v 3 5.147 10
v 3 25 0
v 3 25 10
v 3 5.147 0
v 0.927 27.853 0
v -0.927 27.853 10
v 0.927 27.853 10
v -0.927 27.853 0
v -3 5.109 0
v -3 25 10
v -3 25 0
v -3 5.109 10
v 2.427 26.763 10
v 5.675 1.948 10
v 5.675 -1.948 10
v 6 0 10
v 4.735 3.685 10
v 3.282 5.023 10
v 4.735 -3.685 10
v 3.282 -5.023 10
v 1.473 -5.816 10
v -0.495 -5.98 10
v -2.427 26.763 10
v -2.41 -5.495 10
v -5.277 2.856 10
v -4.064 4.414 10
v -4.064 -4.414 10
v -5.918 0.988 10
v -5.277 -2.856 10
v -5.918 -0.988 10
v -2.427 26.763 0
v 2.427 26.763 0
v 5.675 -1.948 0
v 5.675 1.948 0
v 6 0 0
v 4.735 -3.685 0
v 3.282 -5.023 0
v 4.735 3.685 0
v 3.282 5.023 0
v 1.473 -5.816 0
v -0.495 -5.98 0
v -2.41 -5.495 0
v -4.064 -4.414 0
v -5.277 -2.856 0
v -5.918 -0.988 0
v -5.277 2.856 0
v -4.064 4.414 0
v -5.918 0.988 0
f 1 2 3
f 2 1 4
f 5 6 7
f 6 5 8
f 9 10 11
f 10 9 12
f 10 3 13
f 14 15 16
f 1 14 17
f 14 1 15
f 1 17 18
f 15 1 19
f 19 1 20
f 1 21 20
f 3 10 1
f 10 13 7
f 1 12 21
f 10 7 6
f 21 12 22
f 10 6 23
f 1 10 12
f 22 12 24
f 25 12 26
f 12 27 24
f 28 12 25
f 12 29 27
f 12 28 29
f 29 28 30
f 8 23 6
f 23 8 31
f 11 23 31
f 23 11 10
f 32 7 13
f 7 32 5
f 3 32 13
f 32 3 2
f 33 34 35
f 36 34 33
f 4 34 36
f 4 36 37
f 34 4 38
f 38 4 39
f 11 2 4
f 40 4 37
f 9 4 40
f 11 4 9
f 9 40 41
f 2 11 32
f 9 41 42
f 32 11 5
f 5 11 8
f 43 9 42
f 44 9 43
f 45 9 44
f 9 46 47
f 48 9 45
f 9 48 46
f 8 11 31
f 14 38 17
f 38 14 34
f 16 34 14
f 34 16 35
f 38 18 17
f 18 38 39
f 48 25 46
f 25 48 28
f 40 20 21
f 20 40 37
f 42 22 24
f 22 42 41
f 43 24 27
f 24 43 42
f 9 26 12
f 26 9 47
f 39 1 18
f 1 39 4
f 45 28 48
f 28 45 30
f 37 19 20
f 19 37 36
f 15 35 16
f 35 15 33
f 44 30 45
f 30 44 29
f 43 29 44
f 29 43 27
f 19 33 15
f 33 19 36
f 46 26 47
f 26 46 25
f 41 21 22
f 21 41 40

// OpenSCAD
// LibFile: utilities.scad
//   A collection of utilities originally developed for the OpenFlexure
//   microscope.
//   
//   (c) Richard Bowman, January 2016
//   Released under the CERN Open Hardware License

// Until we figure out a neater way to do this, I am using a commoncode
// block to include this file for the examples.  Using the Include: block
// will be confusing because we don't install it in the libraries folder
// by default...
// CommonCode:
//    use <./openscad/libs/utilities.scad>;


// Function: tiny()
// Description: 
//   This is a tiny distance. In many places, it is helpful to shift
//   surfaces by a small distance, e.g. to ensure overlap or avoid
//   degenerate points.  `tiny()` is that distance, currently 0.05.
//   
//   `tiny()` was formerly known as `d` in the code 
//   but that caused confusion with diameters.
function tiny() = 0.05;

// Function: zero_z()
// Usage: zero_z(vector)
// Description: 
//   Return a copy of a 3-element vector, with the third (z) component set to 0
function zero_z(size) = [size.x, size.y, 0]; //set the Z component of a 3-vector to 0

function if_undefined_set_default(argument, default) = is_undef(argument) ? default : argument;

// Function: translate_x()
// Usage: translate_x(dist)
// Description: 
//   Translate in the X direction.  Equivalent to `translate([dist, 0, 0])`.
module translate_x(x_tr){
    translate([x_tr, 0, 0]){
        children();
    }
}

// Function: translate_y()
// Usage: translate_y(dist)
// Description: 
//   Translate in the Y direction.  Equivalent to `translate([0, dist, 0])`.
module translate_y(y_tr){
    translate([0, y_tr, 0]){
        children();
    }
}

// Function: translate_z()
// Usage: translate_z(dist)
// Description: 
//   Translate in the Z direction.  Equivalent to `translate([0, 0, dist])`.
module translate_z(z_tr){
    translate([0, 0, z_tr]){
        children();
    }
}

// Function: rotate_x()
// Usage: rotate_x(angle)
// Description: Rotate about X axis. Equivalent to `rotate([angle, 0, 0])`.
module rotate_x(x_angle){
    rotate([x_angle, 0, 0]){
        children();
    }
}

// Function: rotate_y()
// Usage: rotate_y(angle)
// Description: Rotate about Y axis. Equivalent to `rotate([0, angle, 0])`.
module rotate_y(y_angle){
    rotate([0, y_angle, 0]){
        children();
    }
}

// Function: rotate_z()
// Usage: rotate_z(angle)
// Description: Rotate about Z axis. Equivalent to `rotate([0, 0, angle])`.
module rotate_z(z_angle){
    rotate([0, 0, z_angle]){
        children();
    }
}

// Function: reflect()
// Usage: reflect(axis)
// Arguments:
//   axis = a 2- or 3D vector giving the axis to reflect in
// Description:
//   Duplicate the children of this module, once unmodified, and
//   once mirrored about the specified axis.  The mirrored copy
//   is equivalent to `mirror(axis) children()`.
//   
//   Conveninece functions `reflect_x`, `reflect_y`, and `reflect_z`
//   are defined to reflect about the respective axes.
// Examples(3D):
//   reflect([1,0,0]) translate([10,0,0]) cube(10);
//   reflect_x() translate([10,0,0]) cube(10);
module reflect(axis){
    //reflects children about the origin, keeping the originals
    children();
    mirror(axis){
        children();
    }
}


module reflect_x(){
    //shorthand for reflecting in x
    reflect([1, 0, 0]){
        children();
    }
}

module reflect_y(){
    //shorthand for reflecting in y
    reflect([0, 1, 0]){
        children();
    }
}

module reflect_z(){
    //shorthand for reflecting in z
    reflect([0, 0, 1]){
        children();
    }
}


function vector_mirror_x(vec) = _vector_mirror_axis(vec, 0);
function vector_mirror_y(vec) = _vector_mirror_axis(vec, 1);
function vector_mirror_z(vec) = _vector_mirror_axis(vec, 2);

function _vector_mirror_axis(vec, axis_index) = [
    for (i = [0:len(vec)-1])
        if (i==axis_index)
            -vec[i]
        else
            vec[i]
];

// Module: repeat()
// Usage: repeat(delta, N, center=false)
// Arguments:
//   delta = vector specifying the displacement between adjacent copies
//   N = total number of copies
//   ---
//   center = The default, `false`, places the first copy at its original location and the last is displaced by `(N-1)*delta`.  Set to `true` to centre the copies on the original location.
// Description:
//   Create a linear arry of copies of a geometry.
// Examples:
//   repeat([10,0,0], 4) cube(5);
//   repeat([10,0,0], 4, center=true) cube(5, center=true);
module repeat(delta, N, center=false){
    //repeat children along a regular array
    center_tr = (center ?  -(N-1)/2 : 0) * delta;
    translate(center_tr){
        for(i=[0:1:(N-1)]){
            translate(i*delta){
                children();
            }
        }
    }
}

module xz_slice(y=0){
    //slice out just the part of something that sits in the XZ plane
    intersection(){
        translate_y(y){
            cube([999,2*tiny(),999],center=true);
        }
        children();
    }
}

module tube(ri, ro, h, center=false){
    difference(){
        cylinder(r=ro, h=h, center=center);
        if (center){
            cylinder(r=ri, h=h+1, center=true);
        }
        else {
            translate_z(-1){
                cylinder(r=ri, h=h+2, center=false);
            }
        }
    }
}

// Module: m4_selftap_hole()
// Usage: m4_selftap_hole(h=5)
// Description:
//   Use to create a hole for an m4 machine screw to self tap into screw using a `difference()`
//   operation. This is a triangular cross-section hole.
module m4_selftap_hole(h=10, center=false){
    // r and flat calculated from the trylinder selftap function used for years.
    // Moving to explicit tested number rather than arbitary calculations.
    trylinder(r=1.3, flat=1.73, h=h, center=center);
}

// Module: no2_selftap_hole()
// Usage: no2_selftap_hole(h=5)
// Description:
//   Use to create a hole for a No2 self-tap screw using a `difference()` operation.
//   This is a triangular cross-section hole.
module no2_selftap_hole(h=10, center=false){
    //This value for r came from test prints. ranging r from 0.3 to 0.5.
    trylinder(r=.3, flat=1.73, h=h, center=center);
}

module no2_selftap_clearancehole(h=10, center=false){
    cylinder(d=2.5, h=h, center=center);
}

module no2_selftap_counterbore(bore_h=999, hole_h=999, flip_z=false, tight=false){
    $fn = 14;
    bore_d = tight ? 4.8 : 5.6;
    generic_counterbore(bore_d=bore_d, bore_h=bore_h, hole_d=2.5, hole_h=hole_h, flip_z=flip_z);
}

// Counterbored through hole for an m3 cap screw counterbore is above z=0
// through hole is below z=0. If flip_z is used the hole is not only flipped in z,
// it is also designed so that the counterbore can print prperly upsidedown
module m3_cap_counterbore(bore_h=999, hole_h=999, flip_z=false){
    $fn = 14;
    generic_counterbore(bore_d=6.5, bore_h=bore_h, hole_d=3.5, hole_h=hole_h, flip_z=flip_z);
}

module generic_counterbore(bore_d, bore_h, hole_d, hole_h, flip_z=false){
    if (flip_z){
        hole_from_bottom(r=hole_d/2, h=hole_h, big_bottom=false);
        translate_z(-(bore_h-tiny())){
            cylinder(d=bore_d, h=bore_h+tiny());
        }
    }
    else{
        translate_z(-hole_h){
            cylinder(d=hole_d, h=hole_h+tiny());
        }
        cylinder(d=bore_d, h=bore_h);
    }
}

module nut(d,h=undef,center=false,fudge=1.18,shaft=false){
    //make a nut, for metric bolt of nominal diameter d
    //d: nominal bolt diameter (e.g. 3 for M3)
    //h: height of nut
    //center: works as for cylinder
    //fudge: multiply the diameter by this number (1.22 works when vertical)
    //shaft: include a long cylinder representing the bolt shaft, diameter=d*1.05
    height = if_undefined_set_default(h, d*0.8);
    union(){
        cylinder(h=height,center=center,r=0.9*d*fudge,$fn=6);
        if(shaft){
            cylinder(r=d/2*1.05*(fudge+1)/2,h=999,$fn=16,center=true);
        }
    }
}

module nut_from_bottom(d,h=undef,fudge=1.2,shaft=true,chamfer_r=0.75,chamfer_h=0.75){
    //make a nut, for metric bolt of nominal diameter d
    //d: nominal bolt diameter (e.g. 3 for M3)
    //h: height of nut
    //center: works as for cylinder
    //fudge: multiply the diameter by this number (1.22 works when vertical)
    //shaft: include a long cylinder representing the bolt shaft, diameter=d*1.05
    height = if_undefined_set_default(h, d*0.8);
    union(){
        cylinder(h=height,r=0.9*d*fudge,$fn=6);
        translate_z(-0.05){
            cylinder(h=chamfer_h,r1=0.9*d*fudge+chamfer_r,r2=0.9*d*fudge,$fn=6);
        }
        mirror([0,0,1]){
            cylinder(h=999,r=0.9*d*fudge+chamfer_r,$fn=6);
        }
        if(shaft){
            sr=d/2*1.05*(fudge+1)/2; //radius of shaft
            translate_z(height/2){
                cylinder(r=sr,h=999,$fn=16,center=true);
            }
            //add a little cut to the roof of the surface so the initial bridges don't have to span the hole.
            intersection(){
                union(){
                    translate_z(height){
                        cube([999,sr*2,0.5],center=true);
                    }
                    translate_z(height+0.25){
                        cube([sr*2,sr*2,0.5],center=true);
                    }
                }
                cylinder(h=height+1,r=0.9*d*fudge,$fn=6);
            }
        }
    }
}

module nut_y(d, h=undef, center=false, fudge=1.1, extra_height=0.7, shaft_length=0, nut_angle=0){
    //make a nut, for metric bolt of nominal diameter d
    //d: nominal bolt diameter (e.g. 3 for M3)
    //h: height of nut
    //center: works as for cylinder
    //fudge: multiply the diameter by this number for a looser fit
    //shaft: include a long cylinder representing the bolt shaft, diameter=d*1.05
    //nut_angle: allows the nut angle to be changed while still having the printable horizontal hole, 0 is flat side down
    height = if_undefined_set_default(h, d*0.8);
    // Radius of a circle circumscribing the points of a nut for thread diameter D
    // 1.06 matches the nut for M3, will be a little too large for M4 and M6
    r=1.06*d*fudge;
    union(){
        rotate([-90, 0, 0]){
            rotate_z(nut_angle){
                cylinder(h=height,center=center,r=r,$fn=6);
            }
        }

        if(shaft_length > 0){
            sl = shaft_length>0 ? shaft_length : 999;
            translate_y(height/2){
                reflect_y(){
                    printable_horizontal_hole(h=sl,r=d/2*1.05*fudge,$fn=16,extra_height=extra_height);
                }
            }
            //Center could be used instead of reflect
        }

        if (nut_angle==0){
            // extra space on top of nut, only makes sense if the nut is flat down/up
            center_y = center ? -height/2 : 0;
            flat_length = 2*r*sin(30);
            center_to_flat = r*cos(30);

            translate([-flat_length/2, center_y ,0]){
                cube([flat_length, height, center_to_flat+extra_height]);
            }
        }
    }
}

// Module: cyl_slot()
// Usage: cyl_slot(r=1, h=1, dy=2, center=false)
// Description: An elongated cylinder use to make a slot for a screw. Slot is oriented in the y direction
// Arguments:
//   r = raduis of the slots
//   h = the height
//   dy = the length of the slot (centre to centre on circles) total length is dy+2*r
//   center = if true the shape is centred on all axes.
// Examples:
//   cyl_slot(r=2, h=10, dy=20);
module cyl_slot(r=1, h=1, dy=2, center=false){

    hull(){
        repeat([0, dy, 0], 2, center=true){
            cylinder(r=r, h=h, center=center);
        }
    }
}

keyhole(10, 6, 3, 25, center=false);
// Module: keyhole()
// Usage: keyhole(h, r_hole, r_slot, l_slot, center=false)
// Arguments:
//   h = height of the keyhole shape
//   r_hole = radius of the larger hole.
//   r_slot = radius of the slot.
//   l_slot = length of the slot (y-dir), from centre of hole to centre of circle at top of slot.
//   ---
//   center = The default, `false`, Whether the shape is centred in z.
// Description:
//   Create a keyhole shaped prism. Main lobe centred at (x,y) = (0,0). Slot
//   in the y-direction.
// Examples:
//   keyhole(10, 2.5, 1.6, 5, center=false);
module keyhole(h, r_hole, r_slot, l_slot, center=false){
    translate_y(l_slot/2){
        cyl_slot(r=r_slot, h=h, dy=l_slot, center=center);
    }
    cylinder(r=r_hole, h=h, center=center);
}

// Module: unrotate()
// Usage: unrotate(rotation)
// Description: 
//   Undoing a rotation is not as simple as `rotate(-rotation)` because
//   `rotate()` applies three separate rotations in order.
//   `unrotate()` reverses this, by applying the rotations in reverse order.
// Example(3D):
//   angles = [30, 60, 45];
//   unrotate(angles) rotate(angles) cylinder(r=2, h=10);
// Example(3D):
//   // This doesn't undo the rotation as you might expect!
//   angles = [30, 60, 45];
//   rotate(-angles) rotate(angles) cylinder(r=2, h=10);
module unrotate(rotation){
    //undo a previous rotation
    //Note: this is not the same as rotate(-rotation) due to ordering.
    rotate_x(-rotation.x){
        rotate_y(-rotation.y){
            rotate_z(-rotation.z){
                children();
            }
        }
    }
}

// Module: sparse_matrix_transform()
// Usage: sparse_matrix_transform(xx=1, yy=1, zz=1, xy=0, xz=0, yx=0, yz=0, zx=0, zy=0, xt=0, yt=0, zt=0)
// Description:
//   Sometimes, a matrix transformation is the right way to get something done.
//   However, specifying a full 4x4 matrix can be a bit clumsy - especially as
//   lots of useful transformations are quite close to the identity matrix.
//   This module allows you to specify individual matrix elements.  Unspecified
//   elements will default to the identity matrix.
// Examples:
//   sparse_matrix_transform(yz=0.5) cylinder(r=5, h=20);
//   sparse_matrix_transform(zy=0.5) cylinder(r=5, h=20);
module sparse_matrix_transform(xx=1, yy=1, zz=1, xy=0, xz=0, yx=0, yz=0, zx=0, zy=0, xt=0, yt=0, zt=0){
    //Apply a matrix transformation, specifying the matrix sparsely
    //This is useful because most helpful matrices are close to the identity.
    matrix = [[xx, xy, xz, xt],
              [yx, yy, yz, yt],
              [zx, zy, zz, zt],
              [0,  0,  0,  1]];
    multmatrix(matrix){
        children();
    }
}


module rightangle_prism(size,center=false){
    intersection(){
        cube(size,center=center);
        rotate_y(45){
            translate_x(999/2){
                cube([1,1,1]*999,center=true);
            }
        }
    }
}

// Module: sequential_hull()
// Usage: sequential_hull()
// Description: 
//   Take the convex hull between each pair in a sequence of geometries.
//   
//   `sequential_hull()` allows the construction of relatively complicated
//   shapes, by "hulling" between pairs of objects.  It must have at least
//   two child modules, though it becomes useful when you have rather more.
//   Using it in conjunction with a sequence of spheres, for example, will
//   create a wire that passes each point.
// Example:
//   sequential_hull(){
//   -- $fn=8;
//       translate([0,0,0]) sphere(2);
//       translate([0,0,15]) sphere(2);
//       translate([15,0,15]) sphere(2);
//       translate([0,15,15]) sphere(2);
//   }
// Example:
//   sequential_hull(){
//       translate([0,0,0]) cylinder(r=2, h=tiny());
//       translate([0,0,5]) cylinder(r=4, h=tiny());
//       translate([0,0,7]) cylinder(r=2, h=tiny());
//       translate([0,0,10]) cylinder(r=6, h=3);
//       translate([0,0,20]) cylinder(r=2, h=tiny());
//   }
module sequential_hull(){
    //given a sequence of >2 children, take the convex hull between each pair - a helpful, general extrusion technique.
    for(i=[0:$children-2]){
        hull(){
            children(i);
            children(i+1);
        }
    }
}

module convex_fillet(r){
    offset(r){
        offset(-r){
            children();
        }
    }
}

module concave_fillet(r){
    offset(-r){
        offset(r){
            children();
        }
    }
}

module thick_section(h=tiny(), center=false, shift=true){
    // A 3D object, corresponding to the linearly-extruded projection of another object.
    // The projection is at z=0 if shift=false, or a tiny distance above z=0 if shift=true.
    offset_thick_section(h=h, center=center, shift=shift){
        children();
    }
}
module offset_thick_section(h=tiny(), offset=0, center=false, shift=true){
    // A 3D object, corresponding to the linearly-extruded projection of another object, where
    // the projection is offset before extrusion.
    // The projection is at z=0 if shift=false, or a tiny distance above z=0 if shift=true.
    linear_extrude(h, center=center){
        offset(r=offset){
            projection(cut=true){
                translate_z(shift ? -tiny() : 0){
                    children();
                }
            }
        }
    }
}

module printable_horizontal_hole(h,r,center=false,extra_height=0.7){
    // Block on top of the hortizontal cylinder. Hulled with the cylinder
    // This forms a 45 degree sloped roof for printing correctly when
    // subtracted from a shape

    top_block_dims = [2*sin(45/2)*r, 2*tiny(), h];
    top_block_z = center ? 0 : h/2;
    top_block_tr = [0, r-tiny(), top_block_z];
    union(){
        rotate([90,0,180]){
            hull(){
                cylinder(h=h,r=r,center=center);
                translate(top_block_tr){
                    cube(top_block_dims, center=true);
                }
            }
            translate(top_block_tr){
                cube(top_block_dims + [0, 2*extra_height, 0], center=true);
            }
        }
    }
}

// Module: square_to_circle()
// Description:
//   Gradually transition from a square to a circle.
//
//   Create a stack of polygons, starting with a square and doubling the
//   number of sides each layer, until we end up with a "circle".
//   
//   Optionally, we can add a cylinder on top, matching the top layer.
// Arguments:
//   r = The radius of the nominal cylinder
//   h = The overall height of the structure
//   ---
//   layers = The number of layers (default is 4).  Each layer will have a height of `h/layers`
//   top_cylinder = The height of the top cylinder.  The top cylinder will have the same number of facets as the final layer, and the whole structure will have a height of `h + top_cylinder`.
module square_to_circle(r, h, layers=4, top_cylinder=0){
    // A stack of thin shapes, starting as a square and
    // gradually gaining sides to turn into a cylinder
    sides=[4,8,16,32,64,128,256]; //number of sides
    for(i=[0:(layers-1)]){
        rotate(180/sides[i]){
            translate_z(i*h/layers){
                cylinder(r=r/cos(180/sides[i]),h=h/layers+tiny(),$fn=sides[i]);
            }
        }
    }

    if(top_cylinder>0){
        translate_z(tiny()){
            cylinder(r=r,h=h+top_cylinder, $fn=sides[layers-1]);
        }
    }
}

// Module: hole_from_bottom()
// Usage: hole_from_bottom(r, h, base_w=-1, delta_z=0.5, layers=4, big_bottom=true)
// Description:
//   A cylinder that is gradually formed from a slot or square at the base.
//   This allows a hole to be formed in the "roof" of a void, with only
//   minimal "stringing" when printed with a fused filament fabrication printer.
//   
//   The most important thing to get right is the first layer, which should be
//   a slot, spanning the full width of the void.  This means that most competent
//   slicers will be able to correctly bridge across the void, parallel to the
//   slot.  You can set the width of the slot using `base_w`, though the neatest
//   way to do this is often with an intersection (see the example).
//   
//   Once you have bridged over the void, leaving a slot for the hole, the next
//   layer will have a square hole.  This should mean the printer bridges over
//   the slot in the layer(s) below, perpendicular to the edges.  Subsequent
//   layers will then fill in the corners, until we have a nice cylinder.
//   
//   You can set `base_w` carefully and just subtract this from the "roof" of
//   a void.  However, it is often easier to set `base_w=999` and 
//   `big_bottom=true`, then take the intersection with your void, see the 
//   example.
// Arguments:
//   r = The radius of the cylinder
//   h = The height of the cylinder
//   ---
//   base_w = The width of the slot at the bottom.  By default it will be 2*r.
//   delta_z = The thickness of the layers.  I suggest twice your printer's layer thickness is a sensible value.
//   layers = The number of steps between square and cylinder (default 4)
//   big_bottom = If true (default), add a very large volume below z=0
// Example(VPT=[0,0,10], VPR=[120, 0, 30], NoAxes):
//   difference(){
//        translate([-10, -10, 0]) cube(20); // The base structure
//   
//        intersection(){
//            cylinder(r=8, h=999, center=true); // This is our void
//   
//            // We set the height of our void by the Z position of 
//            // hole_from_bottom
//            translate([0,0,10]) hole_from_bottom(r=2, h=999, base_w=999, big_bottom=true);
//        }
//      
//        // Cut through the structure so we can see inside
//        rotate(225) translate([-99, 0, -1]) cube(999);
//    }
// Example(2D, NoAxes):
//    -- module example_1(){
//    --     difference(){
//    --         translate([-10, -10, 0]) cube(20); // The base structure
//    --     
//    --         intersection(){
//    --             cylinder(r=8, h=999, center=true); // This is our void
//    --     
//    --             // We set the height of our void by the Z position of 
//    --             // hole_from_bottom
//    --             translate([0,0,10]) hole_from_bottom(r=2, h=999, base_w=999, big_bottom=true);
//    --         }
//    --     }
//    -- }
//    // This code renders some slices through the first example
//    for(i = [0:3]){
//        z = 9.75 + 0.5*i;
//        translate([i*25, 0, 0]) projection(cut=true) translate([0,0,-z]) example_1();
//    }
// Example(3D, VPD=50):
//    hole_from_bottom(r=2, h=10, base_w=10, big_bottom=false);
// Example(3D, VPD=50):
//    hole_from_bottom(r=2, h=10, big_bottom=true);
// See Also: square_to_circle()
module hole_from_bottom(r, h, base_w=-1, delta_z=0.5, layers=4, big_bottom=true){
    // This creates a shape that can be used to create a 3D printable
    // hole in a large bridge. Builds up in layer to avoid unprintable
    // cantilevered paths.

    base = base_w>0 ? [base_w,2*r,2*delta_z] : [2*r,2*r,tiny()];
    union(){
        cube(base,center=true);
        translate_z(base.z/2-tiny()){
            square_to_circle(r, delta_z*4, layers, h-delta_z*5+tiny());
        }
        if(big_bottom){
            mirror([0,0,1]){
                cylinder(r=999,h=999,$fn=8);
            }
        }
    }
}

// Reproduce OpenSCAD's behaviour, setting the number of points
// around a circle based on the max. angle $fa, min. length $fs,
// or exact number $fn.  This follows logic set out in:
// https://en.wikibooks.org/wiki/OpenSCAD_User_Manual/Other_Language_Features#Special_variables
// This gives a fragment of code to calculate the number of points.
// I've duplicated it below, split over a couple of lines to aid readability.
function determine_number_of_fragments(r) = let(
    n_points_from_fa = ceil(360/$fa),
    n_points_from_fs = ceil(r*2*PI/$fs),
    default_n_points = max(min(n_points_from_fa, n_points_from_fs),5), // use minimum size or maximum angle
    n_points = max($fn>0?$fn:default_n_points, 3) // $fn takes precedence, with minimum of 3
) n_points;

module trylinder(r=1, flat=1, h=tiny(), center=false){
    //Triangular prism with filleted corners
    //NOTE the largest cylinder that fits inside it has r=r+f/(2*sqrt(3))
    //One of the sides is parallel with the X axis
    hull(){
        for(a=[0,120,240]){
            rotate(a){
                translate_y(flat/sqrt(3)){
                    cylinder(r=r, h=h, center=center);
                }
            }
        }
    }
}

module trylinder_selftap(nominal_d=3, h=10, center=false){
    // Make a trylinder that you can self-tap a machine screw into.
    // The size is deliberately a bit big for small holes, so that
    // it compensates for splodgy printing
    echo("Warning: `trylinder_selftap` is no longer recommended for use.");
    echo("Use explicitlt defined holes such as `m4_selftap_hole` for screw sizes M4 and above.");
    echo("Use explicit holes for self tap screws, such as `no2_selftap_hole`");
    echo("For machine screws smaller than M4 use nut traps to avoid thread stripping.");
    r = max(nominal_d*0.8/2 + 0.2, nominal_d/2 - 0.2);
    dr = 0.5;
    flat = dr * 2 * sqrt(3);
    trylinder(r=r - dr, flat=flat, h=h, center=center);
}


module trylinder_gripper(inner_r=10,h=6,grip_h=3.5,base_r=-1,t=0.65,squeeze=1,flare=0.8,solid=false){
    // This creates a tapering, distorted hollow cylinder suitable for
    // gripping a small cylindrical (or spherical) object
    // The gripping occurs grip_h above the base, and it flares out
    // again both above and below this.
    // inner_r: radius of the cylinder we're gripping
    // h: overall height of the gripper
    // grip_h: height of the part where the gripper touches the cylinder
    // base_r: radius of the (cylindrical) bottom
    // t: thickness of the walls
    // squeeze: how far the wall must be distorted to fit the cylinder
    // flare: how much larger the top is than the gripping part
    // solid: if true, make a solid outline of the gripper
    $fn=48;
    bottom_r=base_r>0?base_r:inner_r+1+t;

    //TODO: reduce repition
    difference(){
        sequential_hull(){
            cylinder(r=bottom_r,h=tiny());
            translate_z(grip_h-0.5){
                trylinder(r=inner_r-squeeze+t,flat=2.5*squeeze,h=tiny());
            }
            translate_z(grip_h+0.5){
                trylinder(r=inner_r-squeeze+t,flat=2.5*squeeze,h=tiny());
            }
            translate_z(h-tiny()){
                trylinder(r=inner_r-squeeze+flare+t,flat=2.5*squeeze,h=tiny());
            }
        }
        if(solid==false){
            sequential_hull(){
                translate_z(-tiny()){
                    cylinder(r=bottom_r-t,h=tiny());
                }
                translate_z(grip_h-0.5){
                    trylinder(r=inner_r-squeeze,flat=2.5*squeeze,h=tiny());
                }
                translate_z(grip_h+0.5){
                    trylinder(r=inner_r-squeeze,flat=2.5*squeeze,h=tiny());
                }
                translate_z(h){
                    trylinder(r=inner_r-squeeze+flare,flat=2.5*squeeze,h=tiny());
                }
            }
        }
    }
}

module deformable_hole_trylinder(r1, r2, h=99, corner_roc=undef, delta_z=0.5, center=false){
    // A cylinder with feathered edges, to make a hole that is
    // slightly deformable, in an otherwise rigid structure.
    // r1: inner radius
    // r2: outer radius
    // h, center: as for cylinder
    // corner_roc: radius of curvature of the trylinder
    // delta_z: thickness of layers
    n = floor(h/(2*delta_z)); //number of layers in the structure
    flat_l = 2*sqrt(r2*r2 - r1*r1);
    default_corner_radius = r1 - flat_l/(2*sqrt(3));
    corner_radius = if_undefined_set_default(corner_roc, default_corner_radius);
    repeat([0,0,2*delta_z], n, center=center){
        union(){
            cylinder(r=r2, h=delta_z+tiny());
            translate_z(center ? -delta_z : delta_z){
                trylinder(r=corner_radius, flat=flat_l, h=delta_z+tiny());
            }
        }
    }
}


module exterior_brim(r=4, h=0.2, brim_only=false, smooth_r=undef){
    // Add a "brim" around the outside of an object *only*, preserving holes in the object
    // brim width r and the smoothing smooth_r can be defined separately, but default to equal

    _smooth_r = is_undef(smooth_r) ? r : smooth_r;

    if (!brim_only){
        children();
    }

    if(r > 0){
        linear_extrude(h){
            difference(){
                offset(r){
                    offset(-_smooth_r){
                        offset(_smooth_r){
                            projection(cut=true){
                                translate_z(-tiny()){
                                    children();
                                }
                            }
                        }
                    }
                }
                offset(-_smooth_r+tiny()){
                    offset(_smooth_r){
                        projection(cut=true){
                            translate_z(-tiny()){
                                children();
                            }
                        }
                    }
                }
            }
        }
    }
}

module external_fillet_2d(r=3)
{
    offset(r=r){
        offset(r=-r){
            children();
        }
    }
}

module internal_fillet_2d(r=3)
{
    offset(r=-r){
        offset(r=r){
            children();
        }
    }
}

module fillet_2d(r=3)
{
    external_fillet_2d(r=r){
        internal_fillet_2d(r=r){
            children();
        }
    }
}

// Module: cylinder_to_square_column()
// Usage: cylinder_to_square_column(d=20, h=15, transition=5)
//    
// Arguments:
//   d = The diameter of the base cylinder / side length of the square top. d takes precedence if both d and r are defined
//   r = The diameter of the base cylinder / half-side length of the square top. d takes precedence if both d and r are defined 
//   h = Overall height of the column
//   transition = Height of the transition from circle at the base to square. The rest of the column is square. If undefined the transition takes place over the entire height
// Description:
//   A column that smoothly changes from a circular base into a square column. 
//   This is used to allow circular shape on the print bed for better adhesion without brim
//   The transition length can be set independently of the column height. 
//   Optionally define size by radius or diemater.
module cylinder_to_square_column(d=undef, r=undef, h=undef, transition=undef){
    _r = if_undefined_set_default(r, 0.5);
    _d = if_undefined_set_default(d, 2*_r);
    _h = if_undefined_set_default(h, 1);
    _transition = if_undefined_set_default(transition, _h-0.01);
    assert(_transition<_h,"Transition length must be shorter than the column height");
    _thin = _h - _transition ;
    hull(){
        cylinder(d=_d,h=_thin);
        translate([-_d/2,-_d/2,_h-_thin]){
            cube([_d,_d,_thin]);
        }
    }
}
